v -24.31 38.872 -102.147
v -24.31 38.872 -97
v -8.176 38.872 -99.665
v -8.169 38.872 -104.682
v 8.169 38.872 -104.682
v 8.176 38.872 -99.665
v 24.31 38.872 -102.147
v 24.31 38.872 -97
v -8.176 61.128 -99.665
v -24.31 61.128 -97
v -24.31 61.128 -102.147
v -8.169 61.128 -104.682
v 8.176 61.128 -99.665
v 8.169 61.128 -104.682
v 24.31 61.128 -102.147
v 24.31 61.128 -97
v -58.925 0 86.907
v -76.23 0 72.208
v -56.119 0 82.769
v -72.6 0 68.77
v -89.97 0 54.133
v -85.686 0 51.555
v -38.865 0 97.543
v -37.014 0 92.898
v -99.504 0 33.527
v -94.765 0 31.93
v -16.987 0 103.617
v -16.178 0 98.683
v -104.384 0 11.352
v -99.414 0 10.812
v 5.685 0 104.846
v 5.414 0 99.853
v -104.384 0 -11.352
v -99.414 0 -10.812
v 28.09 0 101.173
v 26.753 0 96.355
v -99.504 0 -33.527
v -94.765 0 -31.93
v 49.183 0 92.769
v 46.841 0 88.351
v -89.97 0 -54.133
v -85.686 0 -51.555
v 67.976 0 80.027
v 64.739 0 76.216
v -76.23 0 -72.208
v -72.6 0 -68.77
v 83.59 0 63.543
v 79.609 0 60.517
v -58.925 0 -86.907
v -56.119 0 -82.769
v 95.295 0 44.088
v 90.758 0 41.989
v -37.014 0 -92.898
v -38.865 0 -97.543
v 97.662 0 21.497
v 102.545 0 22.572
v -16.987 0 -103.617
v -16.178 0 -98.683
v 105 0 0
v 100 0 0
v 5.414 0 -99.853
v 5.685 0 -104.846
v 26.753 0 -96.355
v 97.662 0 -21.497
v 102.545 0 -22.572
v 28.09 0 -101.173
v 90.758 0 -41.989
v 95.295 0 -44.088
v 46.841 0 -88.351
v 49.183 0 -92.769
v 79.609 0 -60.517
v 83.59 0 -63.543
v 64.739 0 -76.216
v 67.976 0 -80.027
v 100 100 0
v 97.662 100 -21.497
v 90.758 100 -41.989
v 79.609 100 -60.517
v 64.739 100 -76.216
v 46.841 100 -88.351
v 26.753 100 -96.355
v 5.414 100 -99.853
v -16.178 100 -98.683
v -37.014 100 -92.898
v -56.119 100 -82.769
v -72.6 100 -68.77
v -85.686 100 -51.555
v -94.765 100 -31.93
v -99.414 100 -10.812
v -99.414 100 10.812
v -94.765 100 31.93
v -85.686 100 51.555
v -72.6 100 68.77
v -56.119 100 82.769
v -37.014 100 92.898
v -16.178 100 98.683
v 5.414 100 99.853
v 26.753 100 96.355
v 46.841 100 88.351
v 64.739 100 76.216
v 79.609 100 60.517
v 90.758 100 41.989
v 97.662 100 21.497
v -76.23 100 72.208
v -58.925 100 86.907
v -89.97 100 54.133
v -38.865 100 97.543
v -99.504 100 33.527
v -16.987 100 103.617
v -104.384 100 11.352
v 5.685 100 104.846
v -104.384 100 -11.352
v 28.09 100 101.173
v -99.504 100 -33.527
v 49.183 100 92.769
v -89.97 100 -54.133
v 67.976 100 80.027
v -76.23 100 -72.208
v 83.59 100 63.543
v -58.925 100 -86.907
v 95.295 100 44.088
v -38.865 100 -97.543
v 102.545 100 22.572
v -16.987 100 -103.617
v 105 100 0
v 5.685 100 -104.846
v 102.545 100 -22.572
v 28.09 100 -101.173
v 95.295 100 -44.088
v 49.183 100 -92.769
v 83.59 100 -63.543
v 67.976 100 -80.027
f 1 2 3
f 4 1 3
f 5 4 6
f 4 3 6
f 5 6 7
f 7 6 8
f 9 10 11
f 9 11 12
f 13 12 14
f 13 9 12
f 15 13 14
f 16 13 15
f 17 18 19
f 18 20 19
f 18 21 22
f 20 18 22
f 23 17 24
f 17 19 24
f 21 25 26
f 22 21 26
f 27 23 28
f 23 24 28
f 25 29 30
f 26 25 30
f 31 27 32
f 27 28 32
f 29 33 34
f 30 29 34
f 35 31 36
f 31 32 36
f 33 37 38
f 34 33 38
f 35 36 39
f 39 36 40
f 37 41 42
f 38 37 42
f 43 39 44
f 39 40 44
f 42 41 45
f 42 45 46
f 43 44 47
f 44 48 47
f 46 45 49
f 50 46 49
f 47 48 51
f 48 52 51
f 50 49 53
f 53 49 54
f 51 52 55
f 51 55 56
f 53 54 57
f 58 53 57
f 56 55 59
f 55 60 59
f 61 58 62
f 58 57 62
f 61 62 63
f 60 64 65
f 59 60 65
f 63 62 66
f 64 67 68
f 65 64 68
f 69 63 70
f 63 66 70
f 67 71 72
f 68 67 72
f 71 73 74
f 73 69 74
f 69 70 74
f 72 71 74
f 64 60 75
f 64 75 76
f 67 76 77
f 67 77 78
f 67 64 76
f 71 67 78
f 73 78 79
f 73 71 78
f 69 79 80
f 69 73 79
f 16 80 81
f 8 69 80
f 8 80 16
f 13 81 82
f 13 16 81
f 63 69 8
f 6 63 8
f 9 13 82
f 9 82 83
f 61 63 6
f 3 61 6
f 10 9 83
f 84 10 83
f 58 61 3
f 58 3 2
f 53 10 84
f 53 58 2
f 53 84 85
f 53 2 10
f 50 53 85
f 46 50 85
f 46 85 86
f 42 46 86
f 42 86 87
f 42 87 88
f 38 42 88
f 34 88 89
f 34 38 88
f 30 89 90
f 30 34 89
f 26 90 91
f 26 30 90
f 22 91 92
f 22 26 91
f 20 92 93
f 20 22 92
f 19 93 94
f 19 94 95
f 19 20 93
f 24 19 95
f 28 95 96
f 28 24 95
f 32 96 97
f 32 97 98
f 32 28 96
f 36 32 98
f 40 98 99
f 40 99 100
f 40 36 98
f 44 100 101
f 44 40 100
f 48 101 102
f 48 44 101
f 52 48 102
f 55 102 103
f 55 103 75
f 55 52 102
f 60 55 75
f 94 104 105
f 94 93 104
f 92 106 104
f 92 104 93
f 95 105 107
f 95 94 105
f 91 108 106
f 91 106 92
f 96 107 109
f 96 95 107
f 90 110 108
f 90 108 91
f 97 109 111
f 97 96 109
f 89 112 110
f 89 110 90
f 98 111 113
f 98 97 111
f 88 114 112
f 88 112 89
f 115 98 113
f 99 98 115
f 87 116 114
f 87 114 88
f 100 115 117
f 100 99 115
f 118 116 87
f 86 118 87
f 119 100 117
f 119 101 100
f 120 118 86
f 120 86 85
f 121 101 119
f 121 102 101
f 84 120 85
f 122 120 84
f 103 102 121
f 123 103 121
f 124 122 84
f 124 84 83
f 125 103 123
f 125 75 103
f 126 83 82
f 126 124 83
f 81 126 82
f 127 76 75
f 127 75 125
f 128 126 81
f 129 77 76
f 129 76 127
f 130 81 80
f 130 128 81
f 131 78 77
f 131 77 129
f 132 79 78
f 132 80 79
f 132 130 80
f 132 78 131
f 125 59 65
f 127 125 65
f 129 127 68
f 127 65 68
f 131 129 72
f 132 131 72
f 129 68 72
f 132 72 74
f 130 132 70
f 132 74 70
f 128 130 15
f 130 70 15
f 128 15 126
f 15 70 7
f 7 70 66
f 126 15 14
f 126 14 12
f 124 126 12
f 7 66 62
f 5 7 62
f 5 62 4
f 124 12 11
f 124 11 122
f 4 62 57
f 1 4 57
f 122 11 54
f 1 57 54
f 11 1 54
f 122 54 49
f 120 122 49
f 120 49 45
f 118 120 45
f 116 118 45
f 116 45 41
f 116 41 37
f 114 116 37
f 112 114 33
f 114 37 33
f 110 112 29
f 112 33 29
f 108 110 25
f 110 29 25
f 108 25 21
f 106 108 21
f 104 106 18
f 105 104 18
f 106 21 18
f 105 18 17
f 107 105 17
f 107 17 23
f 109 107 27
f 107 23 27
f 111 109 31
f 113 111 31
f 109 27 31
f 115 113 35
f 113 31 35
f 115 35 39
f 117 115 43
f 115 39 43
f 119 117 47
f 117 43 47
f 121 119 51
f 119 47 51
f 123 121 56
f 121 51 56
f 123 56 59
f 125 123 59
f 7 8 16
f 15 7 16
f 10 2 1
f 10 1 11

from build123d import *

# Parameters (mm, degrees)
SKETCH1_R           = 105
SKETCH1_R_2         = 100
BOSS_EXTRUDE3_DEPTH = 100
SKETCH2_W           = 48.620736816
SKETCH2_H           = 22.255971078
CUT_EXTRUDE2_DEPTH  = 187


with BuildPart() as part:
    # Sketch1 → Boss-Extrude3 (new body)
    with BuildSketch(Plane(origin=(0, 0, 0), x_dir=(1, 0, 0), z_dir=(0, 1, 0))):
        Circle(SKETCH1_R)
        Circle(SKETCH1_R_2, mode=Mode.SUBTRACT)
    extrude(amount=BOSS_EXTRUDE3_DEPTH)

    # Sketch2 → Cut-Extrude2 (cut)
    with BuildSketch(Plane.XY):
        with Locations((0, 50)):
            Rectangle(SKETCH2_W, SKETCH2_H)
    extrude(amount=-CUT_EXTRUDE2_DEPTH, mode=Mode.SUBTRACT)


solid = part.part
